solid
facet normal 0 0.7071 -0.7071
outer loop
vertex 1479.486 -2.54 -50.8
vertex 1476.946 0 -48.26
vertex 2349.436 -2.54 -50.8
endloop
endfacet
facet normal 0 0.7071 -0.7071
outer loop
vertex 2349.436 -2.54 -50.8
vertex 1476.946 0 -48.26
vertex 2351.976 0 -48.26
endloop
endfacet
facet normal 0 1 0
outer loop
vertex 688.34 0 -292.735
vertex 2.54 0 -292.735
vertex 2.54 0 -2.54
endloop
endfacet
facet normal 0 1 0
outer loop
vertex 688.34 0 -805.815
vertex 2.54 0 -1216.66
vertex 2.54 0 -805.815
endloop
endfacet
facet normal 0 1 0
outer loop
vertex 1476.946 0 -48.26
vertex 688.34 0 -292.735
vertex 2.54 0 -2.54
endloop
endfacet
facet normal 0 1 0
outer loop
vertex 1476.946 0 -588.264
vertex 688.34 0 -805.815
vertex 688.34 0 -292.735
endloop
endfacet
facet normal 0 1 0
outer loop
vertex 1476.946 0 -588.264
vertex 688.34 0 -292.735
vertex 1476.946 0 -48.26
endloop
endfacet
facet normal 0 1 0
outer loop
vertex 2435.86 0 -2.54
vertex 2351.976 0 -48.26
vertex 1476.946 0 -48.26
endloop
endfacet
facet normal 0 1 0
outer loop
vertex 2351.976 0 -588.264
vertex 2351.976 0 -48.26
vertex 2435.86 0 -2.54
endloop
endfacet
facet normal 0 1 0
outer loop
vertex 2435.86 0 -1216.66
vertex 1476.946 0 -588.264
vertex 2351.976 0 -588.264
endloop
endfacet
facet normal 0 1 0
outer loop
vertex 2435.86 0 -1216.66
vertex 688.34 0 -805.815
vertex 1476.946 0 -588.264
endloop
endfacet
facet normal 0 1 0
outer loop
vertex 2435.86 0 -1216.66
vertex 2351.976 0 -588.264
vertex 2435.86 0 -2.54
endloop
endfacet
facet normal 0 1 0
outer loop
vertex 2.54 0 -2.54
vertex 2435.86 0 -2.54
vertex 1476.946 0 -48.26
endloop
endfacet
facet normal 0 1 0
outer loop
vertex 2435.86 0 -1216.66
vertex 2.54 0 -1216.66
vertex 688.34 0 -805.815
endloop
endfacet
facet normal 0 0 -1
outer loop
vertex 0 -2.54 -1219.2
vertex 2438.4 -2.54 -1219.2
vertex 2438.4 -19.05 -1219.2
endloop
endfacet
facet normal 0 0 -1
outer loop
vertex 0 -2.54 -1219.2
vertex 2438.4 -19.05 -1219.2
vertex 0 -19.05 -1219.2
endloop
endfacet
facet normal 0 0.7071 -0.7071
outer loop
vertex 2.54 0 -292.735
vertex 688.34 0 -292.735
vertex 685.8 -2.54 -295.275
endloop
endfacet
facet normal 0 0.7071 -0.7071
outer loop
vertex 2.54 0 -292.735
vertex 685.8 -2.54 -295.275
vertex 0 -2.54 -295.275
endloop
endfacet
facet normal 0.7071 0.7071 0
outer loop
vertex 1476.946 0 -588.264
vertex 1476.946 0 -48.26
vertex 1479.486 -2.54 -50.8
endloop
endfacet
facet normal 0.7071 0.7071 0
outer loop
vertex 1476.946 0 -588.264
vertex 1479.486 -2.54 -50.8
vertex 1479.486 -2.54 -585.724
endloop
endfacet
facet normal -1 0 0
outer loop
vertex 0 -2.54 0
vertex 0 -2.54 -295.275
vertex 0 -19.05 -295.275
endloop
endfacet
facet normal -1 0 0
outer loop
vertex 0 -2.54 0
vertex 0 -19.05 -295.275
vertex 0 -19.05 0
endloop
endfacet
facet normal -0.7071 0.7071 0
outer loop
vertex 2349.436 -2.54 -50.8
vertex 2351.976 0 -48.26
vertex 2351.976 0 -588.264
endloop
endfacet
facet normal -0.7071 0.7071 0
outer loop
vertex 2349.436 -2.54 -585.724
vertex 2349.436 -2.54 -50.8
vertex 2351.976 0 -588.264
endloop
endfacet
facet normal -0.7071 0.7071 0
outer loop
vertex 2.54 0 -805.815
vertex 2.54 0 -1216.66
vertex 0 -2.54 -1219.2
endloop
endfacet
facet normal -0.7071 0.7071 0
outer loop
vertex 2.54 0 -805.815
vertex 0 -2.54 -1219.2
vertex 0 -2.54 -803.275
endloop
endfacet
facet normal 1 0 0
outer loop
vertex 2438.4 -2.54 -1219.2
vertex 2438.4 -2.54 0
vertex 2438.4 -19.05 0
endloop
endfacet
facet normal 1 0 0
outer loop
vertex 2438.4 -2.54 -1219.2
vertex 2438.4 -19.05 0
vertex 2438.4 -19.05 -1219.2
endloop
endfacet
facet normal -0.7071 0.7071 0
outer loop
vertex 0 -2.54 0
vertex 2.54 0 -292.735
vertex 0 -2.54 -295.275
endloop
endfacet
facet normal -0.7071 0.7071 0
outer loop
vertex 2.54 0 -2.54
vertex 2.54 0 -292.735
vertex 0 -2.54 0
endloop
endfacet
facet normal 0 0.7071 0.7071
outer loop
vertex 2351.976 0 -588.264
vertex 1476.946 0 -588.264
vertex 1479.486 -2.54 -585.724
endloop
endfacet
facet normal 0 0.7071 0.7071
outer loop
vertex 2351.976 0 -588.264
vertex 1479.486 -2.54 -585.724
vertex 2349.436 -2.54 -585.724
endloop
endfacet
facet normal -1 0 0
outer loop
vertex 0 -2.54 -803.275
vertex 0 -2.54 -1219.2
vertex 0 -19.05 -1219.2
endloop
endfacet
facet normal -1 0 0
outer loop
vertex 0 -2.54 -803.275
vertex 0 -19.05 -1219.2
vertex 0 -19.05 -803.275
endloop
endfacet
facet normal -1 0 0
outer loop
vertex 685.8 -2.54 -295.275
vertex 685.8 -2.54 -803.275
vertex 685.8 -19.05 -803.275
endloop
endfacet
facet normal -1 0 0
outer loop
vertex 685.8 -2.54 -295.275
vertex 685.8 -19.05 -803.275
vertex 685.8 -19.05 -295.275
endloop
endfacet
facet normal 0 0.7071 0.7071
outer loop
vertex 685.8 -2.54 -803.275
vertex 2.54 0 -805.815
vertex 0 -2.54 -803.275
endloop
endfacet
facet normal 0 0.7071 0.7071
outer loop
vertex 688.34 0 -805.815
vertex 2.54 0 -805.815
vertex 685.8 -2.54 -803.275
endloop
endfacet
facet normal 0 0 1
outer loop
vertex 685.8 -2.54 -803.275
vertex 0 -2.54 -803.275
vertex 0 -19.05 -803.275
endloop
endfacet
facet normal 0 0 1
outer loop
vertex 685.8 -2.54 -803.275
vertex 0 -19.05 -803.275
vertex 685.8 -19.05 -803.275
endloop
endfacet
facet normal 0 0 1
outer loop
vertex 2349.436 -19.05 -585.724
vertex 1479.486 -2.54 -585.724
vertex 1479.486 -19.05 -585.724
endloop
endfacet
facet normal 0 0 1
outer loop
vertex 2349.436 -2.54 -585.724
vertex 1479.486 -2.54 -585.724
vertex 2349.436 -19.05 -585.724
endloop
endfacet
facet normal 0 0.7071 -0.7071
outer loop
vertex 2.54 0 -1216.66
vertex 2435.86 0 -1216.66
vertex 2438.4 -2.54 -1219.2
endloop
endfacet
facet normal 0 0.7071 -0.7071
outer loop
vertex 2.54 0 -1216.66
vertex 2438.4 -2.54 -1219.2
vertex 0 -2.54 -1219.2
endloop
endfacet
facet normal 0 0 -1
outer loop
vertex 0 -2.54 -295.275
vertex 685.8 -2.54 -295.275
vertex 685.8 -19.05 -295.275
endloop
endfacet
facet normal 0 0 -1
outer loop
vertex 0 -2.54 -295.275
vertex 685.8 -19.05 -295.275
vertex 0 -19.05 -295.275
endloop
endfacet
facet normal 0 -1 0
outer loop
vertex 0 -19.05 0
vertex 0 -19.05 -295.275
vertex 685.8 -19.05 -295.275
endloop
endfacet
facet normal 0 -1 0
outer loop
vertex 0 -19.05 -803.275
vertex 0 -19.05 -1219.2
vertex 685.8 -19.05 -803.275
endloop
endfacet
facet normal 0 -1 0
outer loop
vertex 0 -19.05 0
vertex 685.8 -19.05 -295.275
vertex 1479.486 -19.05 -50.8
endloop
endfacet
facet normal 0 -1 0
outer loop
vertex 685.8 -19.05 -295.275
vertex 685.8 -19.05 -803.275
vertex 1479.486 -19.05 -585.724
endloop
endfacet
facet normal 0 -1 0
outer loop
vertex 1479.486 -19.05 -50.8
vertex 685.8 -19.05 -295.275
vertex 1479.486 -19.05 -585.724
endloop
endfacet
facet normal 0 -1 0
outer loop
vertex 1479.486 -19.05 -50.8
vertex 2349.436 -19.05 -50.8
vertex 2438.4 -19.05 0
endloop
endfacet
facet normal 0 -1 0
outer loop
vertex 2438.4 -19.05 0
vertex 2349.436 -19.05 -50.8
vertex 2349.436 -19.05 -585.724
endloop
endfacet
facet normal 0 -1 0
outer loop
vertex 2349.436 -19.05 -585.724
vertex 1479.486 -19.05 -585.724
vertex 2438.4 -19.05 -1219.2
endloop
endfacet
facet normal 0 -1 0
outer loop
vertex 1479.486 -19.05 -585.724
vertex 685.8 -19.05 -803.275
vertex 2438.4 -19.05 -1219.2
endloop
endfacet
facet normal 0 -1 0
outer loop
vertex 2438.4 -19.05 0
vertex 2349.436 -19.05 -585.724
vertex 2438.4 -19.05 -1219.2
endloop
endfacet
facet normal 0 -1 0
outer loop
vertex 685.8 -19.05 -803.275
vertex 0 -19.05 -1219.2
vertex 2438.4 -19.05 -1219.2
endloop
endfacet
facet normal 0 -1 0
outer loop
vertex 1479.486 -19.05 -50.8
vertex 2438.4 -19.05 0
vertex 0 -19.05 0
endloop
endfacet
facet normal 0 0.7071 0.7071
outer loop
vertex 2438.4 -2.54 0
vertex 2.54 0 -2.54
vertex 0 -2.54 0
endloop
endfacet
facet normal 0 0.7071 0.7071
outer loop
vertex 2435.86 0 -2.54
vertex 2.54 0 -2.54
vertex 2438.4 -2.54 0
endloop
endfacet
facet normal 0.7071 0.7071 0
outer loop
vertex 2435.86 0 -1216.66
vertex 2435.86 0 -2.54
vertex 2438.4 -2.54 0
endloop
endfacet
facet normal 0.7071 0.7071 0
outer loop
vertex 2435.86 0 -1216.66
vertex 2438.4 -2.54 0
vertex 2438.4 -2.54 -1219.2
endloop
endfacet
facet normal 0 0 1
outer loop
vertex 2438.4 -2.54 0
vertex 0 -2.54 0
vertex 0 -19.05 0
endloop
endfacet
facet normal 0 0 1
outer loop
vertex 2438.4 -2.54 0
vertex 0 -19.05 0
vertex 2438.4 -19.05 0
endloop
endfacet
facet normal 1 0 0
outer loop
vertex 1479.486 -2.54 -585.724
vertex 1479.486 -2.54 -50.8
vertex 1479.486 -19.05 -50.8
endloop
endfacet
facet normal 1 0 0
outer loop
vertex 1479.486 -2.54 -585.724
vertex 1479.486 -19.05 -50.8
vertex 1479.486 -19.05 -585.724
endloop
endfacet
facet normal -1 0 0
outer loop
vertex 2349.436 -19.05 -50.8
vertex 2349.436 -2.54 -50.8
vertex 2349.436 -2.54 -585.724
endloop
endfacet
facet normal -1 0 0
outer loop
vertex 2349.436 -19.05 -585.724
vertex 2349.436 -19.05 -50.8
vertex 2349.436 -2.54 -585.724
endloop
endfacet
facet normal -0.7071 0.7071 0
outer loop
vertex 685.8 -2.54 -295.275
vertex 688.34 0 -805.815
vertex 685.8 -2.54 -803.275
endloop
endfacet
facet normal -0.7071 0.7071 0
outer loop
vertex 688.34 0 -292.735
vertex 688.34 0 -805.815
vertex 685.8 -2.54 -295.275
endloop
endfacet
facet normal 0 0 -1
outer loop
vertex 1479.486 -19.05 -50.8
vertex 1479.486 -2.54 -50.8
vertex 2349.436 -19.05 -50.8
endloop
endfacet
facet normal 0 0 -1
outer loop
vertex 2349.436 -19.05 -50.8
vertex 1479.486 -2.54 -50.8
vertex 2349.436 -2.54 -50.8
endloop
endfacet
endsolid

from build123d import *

# Parameters (mm, degrees)
SKETCH1_W           = 869.95
SKETCH1_H           = 534.924
BOSS_EXTRUDE1_DEPTH = 19.05
CHAMFER1_SIZE       = 2.54


with BuildPart() as part:
    # Sketch1 → Boss-Extrude1 (new body)
    with BuildSketch(Plane(origin=(0, 0, 0), x_dir=(1, 0, 0), z_dir=(0, 1, 0))):
        Polygon((2438.4, 0), (2438.4, 1219.2), (0, 1219.2), (0, 803.275), (685.8, 803.275), (685.8, 295.275), (0, 295.275), (0, 0), align=None)
        with Locations((1914.4615, 318.262)):
            Rectangle(SKETCH1_W, SKETCH1_H, mode=Mode.SUBTRACT)
    extrude(amount=-BOSS_EXTRUDE1_DEPTH)

    # Chamfer1
    chamfer1_edges = [part.edges().sort_by_distance(p)[0] for p in [
        (0, 0, -1011.2375),
        (1219.2, 0, -1219.2),
        (2438.4, 0, -609.6),
        (1219.2, 0, 0),
        (1914.4615, 0, -585.724),
        (1479.4865, 0, -318.262),
        (1914.4615, 0, -50.8),
        (2349.4365, 0, -318.262),
        (0, 0, -147.6375),
        (342.9, 0, -295.275),
        (685.8, 0, -549.275),
        (342.9, 0, -803.275),
    ]]
    chamfer(chamfer1_edges, length=CHAMFER1_SIZE)


solid = part.part
